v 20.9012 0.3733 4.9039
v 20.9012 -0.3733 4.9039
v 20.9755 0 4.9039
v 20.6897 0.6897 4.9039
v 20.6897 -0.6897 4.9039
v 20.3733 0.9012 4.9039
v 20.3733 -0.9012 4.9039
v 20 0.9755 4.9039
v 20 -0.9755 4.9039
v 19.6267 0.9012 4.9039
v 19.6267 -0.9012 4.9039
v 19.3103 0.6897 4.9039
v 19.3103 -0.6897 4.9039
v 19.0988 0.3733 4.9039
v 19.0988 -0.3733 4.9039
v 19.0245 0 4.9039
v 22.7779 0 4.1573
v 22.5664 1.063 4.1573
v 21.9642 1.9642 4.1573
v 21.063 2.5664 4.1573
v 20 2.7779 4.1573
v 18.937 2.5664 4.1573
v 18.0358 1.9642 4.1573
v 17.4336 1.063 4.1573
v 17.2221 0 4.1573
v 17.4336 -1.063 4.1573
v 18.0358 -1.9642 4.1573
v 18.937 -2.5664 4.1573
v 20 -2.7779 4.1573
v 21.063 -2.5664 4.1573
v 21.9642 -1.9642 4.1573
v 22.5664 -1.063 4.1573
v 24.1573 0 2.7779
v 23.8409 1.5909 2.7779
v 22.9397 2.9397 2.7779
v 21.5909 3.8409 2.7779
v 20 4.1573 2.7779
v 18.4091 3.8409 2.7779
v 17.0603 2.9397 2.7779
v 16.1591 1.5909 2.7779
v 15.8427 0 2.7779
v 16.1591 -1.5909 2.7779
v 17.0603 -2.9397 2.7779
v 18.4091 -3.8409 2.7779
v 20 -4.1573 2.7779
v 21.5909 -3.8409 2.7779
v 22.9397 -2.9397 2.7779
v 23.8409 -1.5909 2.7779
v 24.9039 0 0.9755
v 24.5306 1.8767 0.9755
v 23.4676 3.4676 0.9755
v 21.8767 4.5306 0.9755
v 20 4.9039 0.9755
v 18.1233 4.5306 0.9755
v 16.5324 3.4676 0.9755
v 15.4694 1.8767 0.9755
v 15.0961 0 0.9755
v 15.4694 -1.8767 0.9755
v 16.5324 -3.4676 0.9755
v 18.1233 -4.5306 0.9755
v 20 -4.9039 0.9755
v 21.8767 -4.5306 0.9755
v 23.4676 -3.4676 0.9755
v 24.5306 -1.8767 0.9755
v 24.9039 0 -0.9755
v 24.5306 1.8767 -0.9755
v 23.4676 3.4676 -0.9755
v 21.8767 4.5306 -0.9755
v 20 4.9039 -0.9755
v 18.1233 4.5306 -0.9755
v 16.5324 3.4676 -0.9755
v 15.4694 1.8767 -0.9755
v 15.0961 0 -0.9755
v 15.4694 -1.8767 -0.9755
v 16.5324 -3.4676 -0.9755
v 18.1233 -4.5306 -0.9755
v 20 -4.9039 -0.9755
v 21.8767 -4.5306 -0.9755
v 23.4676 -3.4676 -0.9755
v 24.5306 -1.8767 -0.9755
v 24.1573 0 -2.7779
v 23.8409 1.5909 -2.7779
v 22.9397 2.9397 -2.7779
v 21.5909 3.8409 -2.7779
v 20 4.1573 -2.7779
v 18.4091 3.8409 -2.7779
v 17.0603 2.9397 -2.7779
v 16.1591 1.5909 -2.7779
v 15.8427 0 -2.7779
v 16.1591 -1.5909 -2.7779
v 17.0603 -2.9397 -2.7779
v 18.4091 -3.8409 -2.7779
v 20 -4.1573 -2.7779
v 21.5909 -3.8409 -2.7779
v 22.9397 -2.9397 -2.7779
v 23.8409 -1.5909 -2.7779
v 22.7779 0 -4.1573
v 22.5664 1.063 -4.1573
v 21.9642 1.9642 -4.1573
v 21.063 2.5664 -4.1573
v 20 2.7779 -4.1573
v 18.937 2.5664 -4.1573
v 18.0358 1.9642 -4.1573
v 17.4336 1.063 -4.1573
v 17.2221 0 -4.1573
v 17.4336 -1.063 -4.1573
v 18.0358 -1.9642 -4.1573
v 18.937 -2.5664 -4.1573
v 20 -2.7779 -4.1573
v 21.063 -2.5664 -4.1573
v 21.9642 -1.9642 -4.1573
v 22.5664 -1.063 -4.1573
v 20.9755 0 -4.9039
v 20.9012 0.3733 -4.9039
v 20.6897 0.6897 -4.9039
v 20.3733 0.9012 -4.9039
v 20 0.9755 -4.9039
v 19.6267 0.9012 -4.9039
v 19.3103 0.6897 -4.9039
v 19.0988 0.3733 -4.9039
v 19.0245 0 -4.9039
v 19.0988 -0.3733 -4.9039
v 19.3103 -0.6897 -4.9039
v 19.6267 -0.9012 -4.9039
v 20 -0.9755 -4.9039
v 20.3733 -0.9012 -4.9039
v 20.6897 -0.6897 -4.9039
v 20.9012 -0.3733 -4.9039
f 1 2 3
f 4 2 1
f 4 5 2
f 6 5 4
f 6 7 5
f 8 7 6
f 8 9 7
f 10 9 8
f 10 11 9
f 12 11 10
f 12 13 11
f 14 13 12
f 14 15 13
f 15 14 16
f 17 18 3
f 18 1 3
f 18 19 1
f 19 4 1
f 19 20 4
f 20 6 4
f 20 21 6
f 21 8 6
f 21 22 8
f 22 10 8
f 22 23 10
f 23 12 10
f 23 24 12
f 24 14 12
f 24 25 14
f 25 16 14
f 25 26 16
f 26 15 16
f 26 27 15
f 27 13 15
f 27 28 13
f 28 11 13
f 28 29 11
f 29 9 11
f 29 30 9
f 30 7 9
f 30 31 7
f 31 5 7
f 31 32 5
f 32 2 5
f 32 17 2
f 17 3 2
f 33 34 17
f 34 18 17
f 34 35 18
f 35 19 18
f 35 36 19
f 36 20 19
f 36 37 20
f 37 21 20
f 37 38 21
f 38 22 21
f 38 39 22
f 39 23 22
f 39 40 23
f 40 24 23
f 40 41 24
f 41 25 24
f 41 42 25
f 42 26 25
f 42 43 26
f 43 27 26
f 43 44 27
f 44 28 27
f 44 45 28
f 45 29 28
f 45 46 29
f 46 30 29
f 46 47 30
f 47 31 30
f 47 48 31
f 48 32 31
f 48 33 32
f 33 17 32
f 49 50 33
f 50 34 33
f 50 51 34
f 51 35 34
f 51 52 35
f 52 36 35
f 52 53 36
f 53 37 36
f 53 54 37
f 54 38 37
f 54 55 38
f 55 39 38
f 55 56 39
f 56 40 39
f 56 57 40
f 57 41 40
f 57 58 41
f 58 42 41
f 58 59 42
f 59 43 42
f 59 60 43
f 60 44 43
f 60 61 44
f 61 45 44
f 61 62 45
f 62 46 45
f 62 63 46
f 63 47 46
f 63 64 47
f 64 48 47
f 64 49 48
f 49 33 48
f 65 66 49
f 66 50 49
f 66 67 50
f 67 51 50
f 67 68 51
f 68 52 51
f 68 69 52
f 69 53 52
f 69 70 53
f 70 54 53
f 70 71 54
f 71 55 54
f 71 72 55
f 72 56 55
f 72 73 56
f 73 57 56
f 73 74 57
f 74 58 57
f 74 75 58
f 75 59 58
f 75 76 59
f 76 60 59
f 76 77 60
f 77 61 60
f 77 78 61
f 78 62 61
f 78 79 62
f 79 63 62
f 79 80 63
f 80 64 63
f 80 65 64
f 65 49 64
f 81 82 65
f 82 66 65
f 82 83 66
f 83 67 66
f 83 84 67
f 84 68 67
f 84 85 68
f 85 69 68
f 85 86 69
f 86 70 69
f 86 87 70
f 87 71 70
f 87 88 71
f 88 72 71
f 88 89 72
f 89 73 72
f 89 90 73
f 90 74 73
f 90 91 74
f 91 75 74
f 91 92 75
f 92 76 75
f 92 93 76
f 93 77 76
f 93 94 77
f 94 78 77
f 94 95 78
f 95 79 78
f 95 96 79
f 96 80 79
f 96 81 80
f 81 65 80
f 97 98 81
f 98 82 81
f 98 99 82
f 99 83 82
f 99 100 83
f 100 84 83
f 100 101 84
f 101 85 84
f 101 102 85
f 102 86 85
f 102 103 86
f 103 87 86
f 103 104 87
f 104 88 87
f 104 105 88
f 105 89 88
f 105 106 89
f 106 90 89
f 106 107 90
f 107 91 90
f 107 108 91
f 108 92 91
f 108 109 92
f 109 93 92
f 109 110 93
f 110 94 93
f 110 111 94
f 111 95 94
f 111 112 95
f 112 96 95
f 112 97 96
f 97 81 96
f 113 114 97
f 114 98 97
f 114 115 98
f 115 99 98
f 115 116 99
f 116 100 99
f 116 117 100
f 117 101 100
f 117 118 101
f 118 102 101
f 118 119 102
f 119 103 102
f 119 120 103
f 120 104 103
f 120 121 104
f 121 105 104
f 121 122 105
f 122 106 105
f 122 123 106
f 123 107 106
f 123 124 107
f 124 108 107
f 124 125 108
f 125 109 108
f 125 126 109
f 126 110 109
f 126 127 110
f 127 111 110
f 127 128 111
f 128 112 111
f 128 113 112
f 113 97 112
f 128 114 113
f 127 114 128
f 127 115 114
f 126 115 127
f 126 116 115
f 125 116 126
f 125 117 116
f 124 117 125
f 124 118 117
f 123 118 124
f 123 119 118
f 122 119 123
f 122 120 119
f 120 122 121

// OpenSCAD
// file: inc2.scad
//include <inc3.scad>

a = 3;

module foo2(r) {
  translate([r*10,0,0]) sphere (a+r);
  //foo3(a);
}
//foo2(2*a);
// main file
include <inc2.scad>

mv=3;
module mf(){ sphere();}

echo(a);
foo2(2);

//axisHelper();
